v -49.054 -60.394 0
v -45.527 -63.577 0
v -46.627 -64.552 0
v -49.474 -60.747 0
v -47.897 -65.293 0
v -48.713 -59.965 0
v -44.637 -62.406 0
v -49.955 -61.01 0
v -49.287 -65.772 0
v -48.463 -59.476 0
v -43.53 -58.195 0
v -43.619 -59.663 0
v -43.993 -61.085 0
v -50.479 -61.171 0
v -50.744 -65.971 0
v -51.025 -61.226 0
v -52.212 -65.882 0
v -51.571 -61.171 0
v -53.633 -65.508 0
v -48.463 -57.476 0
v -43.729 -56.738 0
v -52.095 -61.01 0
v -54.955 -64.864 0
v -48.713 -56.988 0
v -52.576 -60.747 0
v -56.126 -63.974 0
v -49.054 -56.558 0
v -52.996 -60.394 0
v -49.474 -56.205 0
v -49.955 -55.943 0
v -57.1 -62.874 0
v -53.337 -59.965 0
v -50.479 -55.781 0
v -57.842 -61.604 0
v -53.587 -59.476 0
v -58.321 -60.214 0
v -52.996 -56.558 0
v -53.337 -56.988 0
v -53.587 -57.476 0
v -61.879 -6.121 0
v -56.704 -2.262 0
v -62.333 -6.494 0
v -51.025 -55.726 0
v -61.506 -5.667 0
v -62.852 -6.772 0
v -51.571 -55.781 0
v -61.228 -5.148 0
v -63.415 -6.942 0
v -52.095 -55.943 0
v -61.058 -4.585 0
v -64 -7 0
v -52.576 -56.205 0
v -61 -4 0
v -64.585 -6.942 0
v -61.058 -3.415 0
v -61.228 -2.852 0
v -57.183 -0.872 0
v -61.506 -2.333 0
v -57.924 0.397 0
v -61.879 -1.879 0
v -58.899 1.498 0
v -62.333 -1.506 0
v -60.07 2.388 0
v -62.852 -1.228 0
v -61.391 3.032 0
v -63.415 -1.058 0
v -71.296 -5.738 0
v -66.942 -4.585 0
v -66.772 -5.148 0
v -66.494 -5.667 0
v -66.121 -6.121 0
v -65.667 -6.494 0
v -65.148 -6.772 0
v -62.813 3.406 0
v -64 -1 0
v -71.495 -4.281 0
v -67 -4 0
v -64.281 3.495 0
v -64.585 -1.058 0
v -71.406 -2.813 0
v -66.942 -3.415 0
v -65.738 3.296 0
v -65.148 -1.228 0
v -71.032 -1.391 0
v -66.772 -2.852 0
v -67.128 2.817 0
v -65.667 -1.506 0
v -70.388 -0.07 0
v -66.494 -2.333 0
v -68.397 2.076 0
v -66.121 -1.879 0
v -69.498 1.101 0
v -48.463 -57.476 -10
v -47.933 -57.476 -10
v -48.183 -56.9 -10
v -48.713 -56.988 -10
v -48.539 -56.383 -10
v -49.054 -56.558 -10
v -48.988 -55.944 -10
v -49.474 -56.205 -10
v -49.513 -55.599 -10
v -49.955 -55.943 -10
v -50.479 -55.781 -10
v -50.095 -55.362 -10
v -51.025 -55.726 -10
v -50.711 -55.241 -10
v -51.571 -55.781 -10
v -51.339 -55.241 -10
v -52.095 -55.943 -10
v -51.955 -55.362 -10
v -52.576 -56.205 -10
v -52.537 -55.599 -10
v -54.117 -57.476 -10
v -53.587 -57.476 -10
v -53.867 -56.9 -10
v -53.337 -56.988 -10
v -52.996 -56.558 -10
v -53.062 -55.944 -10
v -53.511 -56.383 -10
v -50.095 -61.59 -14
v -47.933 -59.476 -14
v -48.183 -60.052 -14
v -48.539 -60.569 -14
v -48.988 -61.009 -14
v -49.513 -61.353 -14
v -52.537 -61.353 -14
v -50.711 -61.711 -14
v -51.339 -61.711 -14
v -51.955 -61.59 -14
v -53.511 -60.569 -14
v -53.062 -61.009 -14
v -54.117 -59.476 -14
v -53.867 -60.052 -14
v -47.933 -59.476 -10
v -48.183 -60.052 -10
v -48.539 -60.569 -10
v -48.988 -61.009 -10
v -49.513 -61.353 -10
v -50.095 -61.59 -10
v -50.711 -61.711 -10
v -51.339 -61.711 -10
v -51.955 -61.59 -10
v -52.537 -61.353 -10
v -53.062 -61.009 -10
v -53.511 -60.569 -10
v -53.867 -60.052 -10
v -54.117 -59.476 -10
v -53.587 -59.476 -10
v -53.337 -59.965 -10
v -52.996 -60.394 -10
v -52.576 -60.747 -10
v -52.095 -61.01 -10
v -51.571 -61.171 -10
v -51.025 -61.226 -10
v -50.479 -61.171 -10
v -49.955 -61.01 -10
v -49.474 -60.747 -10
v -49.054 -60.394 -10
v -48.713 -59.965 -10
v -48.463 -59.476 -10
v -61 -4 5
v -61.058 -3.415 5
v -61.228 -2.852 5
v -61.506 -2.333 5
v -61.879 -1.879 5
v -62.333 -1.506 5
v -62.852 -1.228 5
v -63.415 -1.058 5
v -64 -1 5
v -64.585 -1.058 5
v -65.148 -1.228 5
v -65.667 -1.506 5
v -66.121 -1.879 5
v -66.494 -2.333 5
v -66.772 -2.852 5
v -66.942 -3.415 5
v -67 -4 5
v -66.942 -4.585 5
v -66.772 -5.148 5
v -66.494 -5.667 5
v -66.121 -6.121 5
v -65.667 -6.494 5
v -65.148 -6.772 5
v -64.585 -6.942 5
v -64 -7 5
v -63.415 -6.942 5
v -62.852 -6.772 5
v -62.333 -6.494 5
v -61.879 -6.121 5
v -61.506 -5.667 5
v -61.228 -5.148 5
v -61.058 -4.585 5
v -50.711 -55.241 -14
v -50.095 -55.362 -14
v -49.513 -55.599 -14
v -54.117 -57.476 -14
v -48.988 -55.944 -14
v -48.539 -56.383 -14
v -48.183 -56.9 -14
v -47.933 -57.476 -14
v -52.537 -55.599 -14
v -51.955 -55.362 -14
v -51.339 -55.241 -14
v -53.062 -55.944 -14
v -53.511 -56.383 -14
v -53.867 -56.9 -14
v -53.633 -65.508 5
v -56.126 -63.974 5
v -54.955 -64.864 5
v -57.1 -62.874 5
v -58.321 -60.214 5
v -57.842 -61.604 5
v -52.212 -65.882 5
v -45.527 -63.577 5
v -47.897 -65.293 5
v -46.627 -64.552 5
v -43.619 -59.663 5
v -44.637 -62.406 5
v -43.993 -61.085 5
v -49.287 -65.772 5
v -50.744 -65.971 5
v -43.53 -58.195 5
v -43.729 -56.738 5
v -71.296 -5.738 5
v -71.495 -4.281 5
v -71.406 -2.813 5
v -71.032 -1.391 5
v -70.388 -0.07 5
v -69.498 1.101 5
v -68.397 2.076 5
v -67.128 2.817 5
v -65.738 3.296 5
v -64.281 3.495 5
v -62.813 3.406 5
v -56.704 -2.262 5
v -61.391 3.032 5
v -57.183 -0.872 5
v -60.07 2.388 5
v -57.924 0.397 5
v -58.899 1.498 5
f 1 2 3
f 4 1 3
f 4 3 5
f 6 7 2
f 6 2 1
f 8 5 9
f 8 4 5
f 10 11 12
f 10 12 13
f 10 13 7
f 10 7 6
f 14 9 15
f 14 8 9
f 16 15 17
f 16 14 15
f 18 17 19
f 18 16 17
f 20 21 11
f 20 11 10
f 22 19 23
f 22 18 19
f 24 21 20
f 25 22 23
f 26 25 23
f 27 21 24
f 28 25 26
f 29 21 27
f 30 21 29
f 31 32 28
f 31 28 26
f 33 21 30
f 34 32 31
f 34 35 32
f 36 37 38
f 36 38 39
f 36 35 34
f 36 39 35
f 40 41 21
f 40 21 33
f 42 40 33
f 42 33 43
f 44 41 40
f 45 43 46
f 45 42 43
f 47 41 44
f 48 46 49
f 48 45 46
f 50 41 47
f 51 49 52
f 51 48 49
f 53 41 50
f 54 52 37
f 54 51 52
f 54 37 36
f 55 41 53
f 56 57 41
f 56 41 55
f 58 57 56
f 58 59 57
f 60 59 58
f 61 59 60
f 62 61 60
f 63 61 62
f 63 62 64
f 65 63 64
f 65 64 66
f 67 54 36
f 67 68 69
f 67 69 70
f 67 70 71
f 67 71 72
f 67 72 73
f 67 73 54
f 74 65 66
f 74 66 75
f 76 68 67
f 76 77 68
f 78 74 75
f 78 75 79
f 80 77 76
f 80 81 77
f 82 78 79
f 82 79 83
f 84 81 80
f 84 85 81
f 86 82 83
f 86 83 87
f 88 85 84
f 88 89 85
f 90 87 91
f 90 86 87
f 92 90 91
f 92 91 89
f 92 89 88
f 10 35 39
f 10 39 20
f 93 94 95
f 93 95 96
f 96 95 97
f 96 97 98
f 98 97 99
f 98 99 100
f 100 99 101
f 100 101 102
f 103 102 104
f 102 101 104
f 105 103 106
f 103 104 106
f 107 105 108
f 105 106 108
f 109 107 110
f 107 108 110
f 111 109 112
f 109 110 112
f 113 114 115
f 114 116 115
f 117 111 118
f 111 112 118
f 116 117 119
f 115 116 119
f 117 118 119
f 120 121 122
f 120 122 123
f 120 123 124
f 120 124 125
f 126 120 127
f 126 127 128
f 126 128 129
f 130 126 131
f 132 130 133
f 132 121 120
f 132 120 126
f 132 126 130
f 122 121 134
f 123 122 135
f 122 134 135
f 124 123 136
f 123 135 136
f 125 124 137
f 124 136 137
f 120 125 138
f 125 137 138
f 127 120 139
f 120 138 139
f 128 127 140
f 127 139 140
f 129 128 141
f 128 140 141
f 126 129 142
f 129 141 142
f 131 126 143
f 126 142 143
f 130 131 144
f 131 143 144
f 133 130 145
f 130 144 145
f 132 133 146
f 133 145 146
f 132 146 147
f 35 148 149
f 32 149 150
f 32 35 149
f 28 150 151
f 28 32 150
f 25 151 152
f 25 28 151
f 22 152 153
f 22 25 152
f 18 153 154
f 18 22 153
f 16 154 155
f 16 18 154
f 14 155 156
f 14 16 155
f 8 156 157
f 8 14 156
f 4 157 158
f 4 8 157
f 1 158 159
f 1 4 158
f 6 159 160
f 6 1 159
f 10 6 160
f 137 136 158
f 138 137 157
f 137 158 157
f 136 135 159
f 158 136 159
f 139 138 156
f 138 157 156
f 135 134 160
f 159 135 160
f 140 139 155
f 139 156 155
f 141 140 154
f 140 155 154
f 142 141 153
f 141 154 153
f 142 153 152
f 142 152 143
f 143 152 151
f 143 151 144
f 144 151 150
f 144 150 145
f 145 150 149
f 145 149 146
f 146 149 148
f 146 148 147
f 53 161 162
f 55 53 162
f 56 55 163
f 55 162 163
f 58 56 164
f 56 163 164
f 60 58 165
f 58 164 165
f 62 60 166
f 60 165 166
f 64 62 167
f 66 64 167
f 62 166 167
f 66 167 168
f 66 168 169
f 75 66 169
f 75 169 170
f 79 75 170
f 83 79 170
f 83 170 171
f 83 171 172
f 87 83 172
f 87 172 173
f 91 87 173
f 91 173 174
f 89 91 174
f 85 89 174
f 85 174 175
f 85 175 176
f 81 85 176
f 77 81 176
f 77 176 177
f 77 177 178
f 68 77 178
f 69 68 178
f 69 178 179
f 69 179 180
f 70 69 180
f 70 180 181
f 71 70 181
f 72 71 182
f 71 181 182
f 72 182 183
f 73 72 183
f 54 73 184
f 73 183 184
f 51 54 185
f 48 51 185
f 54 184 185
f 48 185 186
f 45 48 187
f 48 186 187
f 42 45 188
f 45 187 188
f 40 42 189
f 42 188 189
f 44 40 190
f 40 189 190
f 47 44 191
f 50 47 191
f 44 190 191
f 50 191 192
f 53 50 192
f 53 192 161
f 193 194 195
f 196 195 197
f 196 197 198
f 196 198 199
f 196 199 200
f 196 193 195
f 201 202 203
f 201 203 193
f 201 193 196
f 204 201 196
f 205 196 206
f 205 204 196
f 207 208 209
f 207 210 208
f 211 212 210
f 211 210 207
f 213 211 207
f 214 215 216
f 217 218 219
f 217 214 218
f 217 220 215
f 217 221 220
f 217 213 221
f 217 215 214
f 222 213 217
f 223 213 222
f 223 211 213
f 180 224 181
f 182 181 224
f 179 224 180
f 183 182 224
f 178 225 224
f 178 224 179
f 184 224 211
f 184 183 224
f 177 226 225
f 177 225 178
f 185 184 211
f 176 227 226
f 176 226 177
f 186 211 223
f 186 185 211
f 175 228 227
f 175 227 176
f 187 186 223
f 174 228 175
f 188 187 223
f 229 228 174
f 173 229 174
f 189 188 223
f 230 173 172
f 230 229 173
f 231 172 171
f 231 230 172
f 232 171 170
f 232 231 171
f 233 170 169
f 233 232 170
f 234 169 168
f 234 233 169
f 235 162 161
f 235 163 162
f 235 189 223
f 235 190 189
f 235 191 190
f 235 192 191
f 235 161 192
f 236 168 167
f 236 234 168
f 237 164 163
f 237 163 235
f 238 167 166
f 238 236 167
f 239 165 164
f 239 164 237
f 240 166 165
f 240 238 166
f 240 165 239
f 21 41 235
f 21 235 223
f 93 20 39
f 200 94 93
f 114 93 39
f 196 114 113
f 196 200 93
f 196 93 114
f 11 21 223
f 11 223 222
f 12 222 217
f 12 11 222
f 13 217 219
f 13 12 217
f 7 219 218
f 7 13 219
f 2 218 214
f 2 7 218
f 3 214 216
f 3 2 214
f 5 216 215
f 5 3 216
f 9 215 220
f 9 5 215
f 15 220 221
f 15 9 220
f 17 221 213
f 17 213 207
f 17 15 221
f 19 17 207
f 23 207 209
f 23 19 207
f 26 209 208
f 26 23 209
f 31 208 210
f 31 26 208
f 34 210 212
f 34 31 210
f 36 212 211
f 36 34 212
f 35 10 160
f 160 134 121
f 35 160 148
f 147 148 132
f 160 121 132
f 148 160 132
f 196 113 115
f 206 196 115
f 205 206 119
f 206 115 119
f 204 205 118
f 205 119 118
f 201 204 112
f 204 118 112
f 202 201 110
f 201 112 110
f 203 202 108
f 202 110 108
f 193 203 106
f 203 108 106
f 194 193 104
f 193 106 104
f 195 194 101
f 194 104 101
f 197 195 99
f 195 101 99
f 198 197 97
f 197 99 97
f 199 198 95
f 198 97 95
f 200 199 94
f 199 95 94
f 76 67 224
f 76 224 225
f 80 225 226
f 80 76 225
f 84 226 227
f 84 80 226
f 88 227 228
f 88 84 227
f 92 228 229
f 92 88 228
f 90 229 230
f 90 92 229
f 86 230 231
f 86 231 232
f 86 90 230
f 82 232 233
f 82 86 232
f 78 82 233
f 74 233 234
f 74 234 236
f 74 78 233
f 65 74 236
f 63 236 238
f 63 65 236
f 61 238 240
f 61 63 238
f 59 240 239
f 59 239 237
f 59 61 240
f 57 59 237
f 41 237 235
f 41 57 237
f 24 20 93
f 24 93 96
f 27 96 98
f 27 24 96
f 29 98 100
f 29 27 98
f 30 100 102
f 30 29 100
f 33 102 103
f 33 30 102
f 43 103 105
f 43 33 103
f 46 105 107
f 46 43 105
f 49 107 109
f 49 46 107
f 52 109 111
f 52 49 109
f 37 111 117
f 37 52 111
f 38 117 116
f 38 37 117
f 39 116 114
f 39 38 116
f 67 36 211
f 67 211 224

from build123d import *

# Parameters (mm, degrees)
BOSS_EXTRU_1_DEPTH      = 5
ESQUISSE2_R             = 2.75
BOSS_EXTRU_2_DEPTH      = 15
ESQUISSE4_R             = 3.25
BOSS_EXTRU_3_DEPTH      = 4
ESQUISSE5_W             = 10
ESQUISSE5_H             = 2
ENL_V_MAT_EXTRU_2_DEPTH = 14
ESQUISSE6_R             = 3
ENL_V_MAT_EXTRU_3_DEPTH = 14


with BuildPart() as part:
    # Esquisse1 → Boss.-Extru.1 (new body)
    with BuildSketch(Plane.XY):
        with BuildLine():
            Line((-56.704090657, -2.262269623), (-43.729037177, -56.738392716))
            ThreePointArc((-43.729037177, -56.738392716), (-49.287216143, -65.772032435), (-58.320855862, -60.213853469))
            Line((-58.320855862, -60.213853469), (-71.295909343, -5.737730377))
            ThreePointArc((-71.295909343, -5.737730377), (-65.737730377, 3.295909343), (-56.704090657, -2.262269623))
        make_face()
    extrude(amount=BOSS_EXTRU_1_DEPTH)

    # Esquisse2 → Boss.-Extru.2 (add)
    with BuildSketch(Plane.XY.offset(5)):
        with Locations((-51.024946519, -58.476123092)):
            Circle(ESQUISSE2_R)
    extrude(amount=-BOSS_EXTRU_2_DEPTH)

    # Esquisse4 → Boss.-Extru.3 (add)
    with BuildSketch(Plane(origin=(0, 0, -10), x_dir=(-1, 0, 0), z_dir=(0, 0, -1))):
        with Locations((51.024946519, -58.476123092)):
            Circle(ESQUISSE4_R)
    extrude(amount=BOSS_EXTRU_3_DEPTH)

    # Esquisse5 → Enlèv. mat.-Extru.2 (cut)
    with BuildSketch(Plane(origin=(0, 0, -14), x_dir=(-1, 0, 0), z_dir=(0, 0, -1))):
        with Locations((51.024946519, -58.476123092)):
            Rectangle(ESQUISSE5_W, ESQUISSE5_H)
    extrude(amount=-ENL_V_MAT_EXTRU_2_DEPTH, mode=Mode.SUBTRACT)

    # Esquisse6 → Enlèv. mat.-Extru.3 (cut)
    with BuildSketch(Plane.XY.offset(5)):
        with Locations((-64, -4)):
            Circle(ESQUISSE6_R)
    extrude(amount=-ENL_V_MAT_EXTRU_3_DEPTH, mode=Mode.SUBTRACT)


solid = part.part
